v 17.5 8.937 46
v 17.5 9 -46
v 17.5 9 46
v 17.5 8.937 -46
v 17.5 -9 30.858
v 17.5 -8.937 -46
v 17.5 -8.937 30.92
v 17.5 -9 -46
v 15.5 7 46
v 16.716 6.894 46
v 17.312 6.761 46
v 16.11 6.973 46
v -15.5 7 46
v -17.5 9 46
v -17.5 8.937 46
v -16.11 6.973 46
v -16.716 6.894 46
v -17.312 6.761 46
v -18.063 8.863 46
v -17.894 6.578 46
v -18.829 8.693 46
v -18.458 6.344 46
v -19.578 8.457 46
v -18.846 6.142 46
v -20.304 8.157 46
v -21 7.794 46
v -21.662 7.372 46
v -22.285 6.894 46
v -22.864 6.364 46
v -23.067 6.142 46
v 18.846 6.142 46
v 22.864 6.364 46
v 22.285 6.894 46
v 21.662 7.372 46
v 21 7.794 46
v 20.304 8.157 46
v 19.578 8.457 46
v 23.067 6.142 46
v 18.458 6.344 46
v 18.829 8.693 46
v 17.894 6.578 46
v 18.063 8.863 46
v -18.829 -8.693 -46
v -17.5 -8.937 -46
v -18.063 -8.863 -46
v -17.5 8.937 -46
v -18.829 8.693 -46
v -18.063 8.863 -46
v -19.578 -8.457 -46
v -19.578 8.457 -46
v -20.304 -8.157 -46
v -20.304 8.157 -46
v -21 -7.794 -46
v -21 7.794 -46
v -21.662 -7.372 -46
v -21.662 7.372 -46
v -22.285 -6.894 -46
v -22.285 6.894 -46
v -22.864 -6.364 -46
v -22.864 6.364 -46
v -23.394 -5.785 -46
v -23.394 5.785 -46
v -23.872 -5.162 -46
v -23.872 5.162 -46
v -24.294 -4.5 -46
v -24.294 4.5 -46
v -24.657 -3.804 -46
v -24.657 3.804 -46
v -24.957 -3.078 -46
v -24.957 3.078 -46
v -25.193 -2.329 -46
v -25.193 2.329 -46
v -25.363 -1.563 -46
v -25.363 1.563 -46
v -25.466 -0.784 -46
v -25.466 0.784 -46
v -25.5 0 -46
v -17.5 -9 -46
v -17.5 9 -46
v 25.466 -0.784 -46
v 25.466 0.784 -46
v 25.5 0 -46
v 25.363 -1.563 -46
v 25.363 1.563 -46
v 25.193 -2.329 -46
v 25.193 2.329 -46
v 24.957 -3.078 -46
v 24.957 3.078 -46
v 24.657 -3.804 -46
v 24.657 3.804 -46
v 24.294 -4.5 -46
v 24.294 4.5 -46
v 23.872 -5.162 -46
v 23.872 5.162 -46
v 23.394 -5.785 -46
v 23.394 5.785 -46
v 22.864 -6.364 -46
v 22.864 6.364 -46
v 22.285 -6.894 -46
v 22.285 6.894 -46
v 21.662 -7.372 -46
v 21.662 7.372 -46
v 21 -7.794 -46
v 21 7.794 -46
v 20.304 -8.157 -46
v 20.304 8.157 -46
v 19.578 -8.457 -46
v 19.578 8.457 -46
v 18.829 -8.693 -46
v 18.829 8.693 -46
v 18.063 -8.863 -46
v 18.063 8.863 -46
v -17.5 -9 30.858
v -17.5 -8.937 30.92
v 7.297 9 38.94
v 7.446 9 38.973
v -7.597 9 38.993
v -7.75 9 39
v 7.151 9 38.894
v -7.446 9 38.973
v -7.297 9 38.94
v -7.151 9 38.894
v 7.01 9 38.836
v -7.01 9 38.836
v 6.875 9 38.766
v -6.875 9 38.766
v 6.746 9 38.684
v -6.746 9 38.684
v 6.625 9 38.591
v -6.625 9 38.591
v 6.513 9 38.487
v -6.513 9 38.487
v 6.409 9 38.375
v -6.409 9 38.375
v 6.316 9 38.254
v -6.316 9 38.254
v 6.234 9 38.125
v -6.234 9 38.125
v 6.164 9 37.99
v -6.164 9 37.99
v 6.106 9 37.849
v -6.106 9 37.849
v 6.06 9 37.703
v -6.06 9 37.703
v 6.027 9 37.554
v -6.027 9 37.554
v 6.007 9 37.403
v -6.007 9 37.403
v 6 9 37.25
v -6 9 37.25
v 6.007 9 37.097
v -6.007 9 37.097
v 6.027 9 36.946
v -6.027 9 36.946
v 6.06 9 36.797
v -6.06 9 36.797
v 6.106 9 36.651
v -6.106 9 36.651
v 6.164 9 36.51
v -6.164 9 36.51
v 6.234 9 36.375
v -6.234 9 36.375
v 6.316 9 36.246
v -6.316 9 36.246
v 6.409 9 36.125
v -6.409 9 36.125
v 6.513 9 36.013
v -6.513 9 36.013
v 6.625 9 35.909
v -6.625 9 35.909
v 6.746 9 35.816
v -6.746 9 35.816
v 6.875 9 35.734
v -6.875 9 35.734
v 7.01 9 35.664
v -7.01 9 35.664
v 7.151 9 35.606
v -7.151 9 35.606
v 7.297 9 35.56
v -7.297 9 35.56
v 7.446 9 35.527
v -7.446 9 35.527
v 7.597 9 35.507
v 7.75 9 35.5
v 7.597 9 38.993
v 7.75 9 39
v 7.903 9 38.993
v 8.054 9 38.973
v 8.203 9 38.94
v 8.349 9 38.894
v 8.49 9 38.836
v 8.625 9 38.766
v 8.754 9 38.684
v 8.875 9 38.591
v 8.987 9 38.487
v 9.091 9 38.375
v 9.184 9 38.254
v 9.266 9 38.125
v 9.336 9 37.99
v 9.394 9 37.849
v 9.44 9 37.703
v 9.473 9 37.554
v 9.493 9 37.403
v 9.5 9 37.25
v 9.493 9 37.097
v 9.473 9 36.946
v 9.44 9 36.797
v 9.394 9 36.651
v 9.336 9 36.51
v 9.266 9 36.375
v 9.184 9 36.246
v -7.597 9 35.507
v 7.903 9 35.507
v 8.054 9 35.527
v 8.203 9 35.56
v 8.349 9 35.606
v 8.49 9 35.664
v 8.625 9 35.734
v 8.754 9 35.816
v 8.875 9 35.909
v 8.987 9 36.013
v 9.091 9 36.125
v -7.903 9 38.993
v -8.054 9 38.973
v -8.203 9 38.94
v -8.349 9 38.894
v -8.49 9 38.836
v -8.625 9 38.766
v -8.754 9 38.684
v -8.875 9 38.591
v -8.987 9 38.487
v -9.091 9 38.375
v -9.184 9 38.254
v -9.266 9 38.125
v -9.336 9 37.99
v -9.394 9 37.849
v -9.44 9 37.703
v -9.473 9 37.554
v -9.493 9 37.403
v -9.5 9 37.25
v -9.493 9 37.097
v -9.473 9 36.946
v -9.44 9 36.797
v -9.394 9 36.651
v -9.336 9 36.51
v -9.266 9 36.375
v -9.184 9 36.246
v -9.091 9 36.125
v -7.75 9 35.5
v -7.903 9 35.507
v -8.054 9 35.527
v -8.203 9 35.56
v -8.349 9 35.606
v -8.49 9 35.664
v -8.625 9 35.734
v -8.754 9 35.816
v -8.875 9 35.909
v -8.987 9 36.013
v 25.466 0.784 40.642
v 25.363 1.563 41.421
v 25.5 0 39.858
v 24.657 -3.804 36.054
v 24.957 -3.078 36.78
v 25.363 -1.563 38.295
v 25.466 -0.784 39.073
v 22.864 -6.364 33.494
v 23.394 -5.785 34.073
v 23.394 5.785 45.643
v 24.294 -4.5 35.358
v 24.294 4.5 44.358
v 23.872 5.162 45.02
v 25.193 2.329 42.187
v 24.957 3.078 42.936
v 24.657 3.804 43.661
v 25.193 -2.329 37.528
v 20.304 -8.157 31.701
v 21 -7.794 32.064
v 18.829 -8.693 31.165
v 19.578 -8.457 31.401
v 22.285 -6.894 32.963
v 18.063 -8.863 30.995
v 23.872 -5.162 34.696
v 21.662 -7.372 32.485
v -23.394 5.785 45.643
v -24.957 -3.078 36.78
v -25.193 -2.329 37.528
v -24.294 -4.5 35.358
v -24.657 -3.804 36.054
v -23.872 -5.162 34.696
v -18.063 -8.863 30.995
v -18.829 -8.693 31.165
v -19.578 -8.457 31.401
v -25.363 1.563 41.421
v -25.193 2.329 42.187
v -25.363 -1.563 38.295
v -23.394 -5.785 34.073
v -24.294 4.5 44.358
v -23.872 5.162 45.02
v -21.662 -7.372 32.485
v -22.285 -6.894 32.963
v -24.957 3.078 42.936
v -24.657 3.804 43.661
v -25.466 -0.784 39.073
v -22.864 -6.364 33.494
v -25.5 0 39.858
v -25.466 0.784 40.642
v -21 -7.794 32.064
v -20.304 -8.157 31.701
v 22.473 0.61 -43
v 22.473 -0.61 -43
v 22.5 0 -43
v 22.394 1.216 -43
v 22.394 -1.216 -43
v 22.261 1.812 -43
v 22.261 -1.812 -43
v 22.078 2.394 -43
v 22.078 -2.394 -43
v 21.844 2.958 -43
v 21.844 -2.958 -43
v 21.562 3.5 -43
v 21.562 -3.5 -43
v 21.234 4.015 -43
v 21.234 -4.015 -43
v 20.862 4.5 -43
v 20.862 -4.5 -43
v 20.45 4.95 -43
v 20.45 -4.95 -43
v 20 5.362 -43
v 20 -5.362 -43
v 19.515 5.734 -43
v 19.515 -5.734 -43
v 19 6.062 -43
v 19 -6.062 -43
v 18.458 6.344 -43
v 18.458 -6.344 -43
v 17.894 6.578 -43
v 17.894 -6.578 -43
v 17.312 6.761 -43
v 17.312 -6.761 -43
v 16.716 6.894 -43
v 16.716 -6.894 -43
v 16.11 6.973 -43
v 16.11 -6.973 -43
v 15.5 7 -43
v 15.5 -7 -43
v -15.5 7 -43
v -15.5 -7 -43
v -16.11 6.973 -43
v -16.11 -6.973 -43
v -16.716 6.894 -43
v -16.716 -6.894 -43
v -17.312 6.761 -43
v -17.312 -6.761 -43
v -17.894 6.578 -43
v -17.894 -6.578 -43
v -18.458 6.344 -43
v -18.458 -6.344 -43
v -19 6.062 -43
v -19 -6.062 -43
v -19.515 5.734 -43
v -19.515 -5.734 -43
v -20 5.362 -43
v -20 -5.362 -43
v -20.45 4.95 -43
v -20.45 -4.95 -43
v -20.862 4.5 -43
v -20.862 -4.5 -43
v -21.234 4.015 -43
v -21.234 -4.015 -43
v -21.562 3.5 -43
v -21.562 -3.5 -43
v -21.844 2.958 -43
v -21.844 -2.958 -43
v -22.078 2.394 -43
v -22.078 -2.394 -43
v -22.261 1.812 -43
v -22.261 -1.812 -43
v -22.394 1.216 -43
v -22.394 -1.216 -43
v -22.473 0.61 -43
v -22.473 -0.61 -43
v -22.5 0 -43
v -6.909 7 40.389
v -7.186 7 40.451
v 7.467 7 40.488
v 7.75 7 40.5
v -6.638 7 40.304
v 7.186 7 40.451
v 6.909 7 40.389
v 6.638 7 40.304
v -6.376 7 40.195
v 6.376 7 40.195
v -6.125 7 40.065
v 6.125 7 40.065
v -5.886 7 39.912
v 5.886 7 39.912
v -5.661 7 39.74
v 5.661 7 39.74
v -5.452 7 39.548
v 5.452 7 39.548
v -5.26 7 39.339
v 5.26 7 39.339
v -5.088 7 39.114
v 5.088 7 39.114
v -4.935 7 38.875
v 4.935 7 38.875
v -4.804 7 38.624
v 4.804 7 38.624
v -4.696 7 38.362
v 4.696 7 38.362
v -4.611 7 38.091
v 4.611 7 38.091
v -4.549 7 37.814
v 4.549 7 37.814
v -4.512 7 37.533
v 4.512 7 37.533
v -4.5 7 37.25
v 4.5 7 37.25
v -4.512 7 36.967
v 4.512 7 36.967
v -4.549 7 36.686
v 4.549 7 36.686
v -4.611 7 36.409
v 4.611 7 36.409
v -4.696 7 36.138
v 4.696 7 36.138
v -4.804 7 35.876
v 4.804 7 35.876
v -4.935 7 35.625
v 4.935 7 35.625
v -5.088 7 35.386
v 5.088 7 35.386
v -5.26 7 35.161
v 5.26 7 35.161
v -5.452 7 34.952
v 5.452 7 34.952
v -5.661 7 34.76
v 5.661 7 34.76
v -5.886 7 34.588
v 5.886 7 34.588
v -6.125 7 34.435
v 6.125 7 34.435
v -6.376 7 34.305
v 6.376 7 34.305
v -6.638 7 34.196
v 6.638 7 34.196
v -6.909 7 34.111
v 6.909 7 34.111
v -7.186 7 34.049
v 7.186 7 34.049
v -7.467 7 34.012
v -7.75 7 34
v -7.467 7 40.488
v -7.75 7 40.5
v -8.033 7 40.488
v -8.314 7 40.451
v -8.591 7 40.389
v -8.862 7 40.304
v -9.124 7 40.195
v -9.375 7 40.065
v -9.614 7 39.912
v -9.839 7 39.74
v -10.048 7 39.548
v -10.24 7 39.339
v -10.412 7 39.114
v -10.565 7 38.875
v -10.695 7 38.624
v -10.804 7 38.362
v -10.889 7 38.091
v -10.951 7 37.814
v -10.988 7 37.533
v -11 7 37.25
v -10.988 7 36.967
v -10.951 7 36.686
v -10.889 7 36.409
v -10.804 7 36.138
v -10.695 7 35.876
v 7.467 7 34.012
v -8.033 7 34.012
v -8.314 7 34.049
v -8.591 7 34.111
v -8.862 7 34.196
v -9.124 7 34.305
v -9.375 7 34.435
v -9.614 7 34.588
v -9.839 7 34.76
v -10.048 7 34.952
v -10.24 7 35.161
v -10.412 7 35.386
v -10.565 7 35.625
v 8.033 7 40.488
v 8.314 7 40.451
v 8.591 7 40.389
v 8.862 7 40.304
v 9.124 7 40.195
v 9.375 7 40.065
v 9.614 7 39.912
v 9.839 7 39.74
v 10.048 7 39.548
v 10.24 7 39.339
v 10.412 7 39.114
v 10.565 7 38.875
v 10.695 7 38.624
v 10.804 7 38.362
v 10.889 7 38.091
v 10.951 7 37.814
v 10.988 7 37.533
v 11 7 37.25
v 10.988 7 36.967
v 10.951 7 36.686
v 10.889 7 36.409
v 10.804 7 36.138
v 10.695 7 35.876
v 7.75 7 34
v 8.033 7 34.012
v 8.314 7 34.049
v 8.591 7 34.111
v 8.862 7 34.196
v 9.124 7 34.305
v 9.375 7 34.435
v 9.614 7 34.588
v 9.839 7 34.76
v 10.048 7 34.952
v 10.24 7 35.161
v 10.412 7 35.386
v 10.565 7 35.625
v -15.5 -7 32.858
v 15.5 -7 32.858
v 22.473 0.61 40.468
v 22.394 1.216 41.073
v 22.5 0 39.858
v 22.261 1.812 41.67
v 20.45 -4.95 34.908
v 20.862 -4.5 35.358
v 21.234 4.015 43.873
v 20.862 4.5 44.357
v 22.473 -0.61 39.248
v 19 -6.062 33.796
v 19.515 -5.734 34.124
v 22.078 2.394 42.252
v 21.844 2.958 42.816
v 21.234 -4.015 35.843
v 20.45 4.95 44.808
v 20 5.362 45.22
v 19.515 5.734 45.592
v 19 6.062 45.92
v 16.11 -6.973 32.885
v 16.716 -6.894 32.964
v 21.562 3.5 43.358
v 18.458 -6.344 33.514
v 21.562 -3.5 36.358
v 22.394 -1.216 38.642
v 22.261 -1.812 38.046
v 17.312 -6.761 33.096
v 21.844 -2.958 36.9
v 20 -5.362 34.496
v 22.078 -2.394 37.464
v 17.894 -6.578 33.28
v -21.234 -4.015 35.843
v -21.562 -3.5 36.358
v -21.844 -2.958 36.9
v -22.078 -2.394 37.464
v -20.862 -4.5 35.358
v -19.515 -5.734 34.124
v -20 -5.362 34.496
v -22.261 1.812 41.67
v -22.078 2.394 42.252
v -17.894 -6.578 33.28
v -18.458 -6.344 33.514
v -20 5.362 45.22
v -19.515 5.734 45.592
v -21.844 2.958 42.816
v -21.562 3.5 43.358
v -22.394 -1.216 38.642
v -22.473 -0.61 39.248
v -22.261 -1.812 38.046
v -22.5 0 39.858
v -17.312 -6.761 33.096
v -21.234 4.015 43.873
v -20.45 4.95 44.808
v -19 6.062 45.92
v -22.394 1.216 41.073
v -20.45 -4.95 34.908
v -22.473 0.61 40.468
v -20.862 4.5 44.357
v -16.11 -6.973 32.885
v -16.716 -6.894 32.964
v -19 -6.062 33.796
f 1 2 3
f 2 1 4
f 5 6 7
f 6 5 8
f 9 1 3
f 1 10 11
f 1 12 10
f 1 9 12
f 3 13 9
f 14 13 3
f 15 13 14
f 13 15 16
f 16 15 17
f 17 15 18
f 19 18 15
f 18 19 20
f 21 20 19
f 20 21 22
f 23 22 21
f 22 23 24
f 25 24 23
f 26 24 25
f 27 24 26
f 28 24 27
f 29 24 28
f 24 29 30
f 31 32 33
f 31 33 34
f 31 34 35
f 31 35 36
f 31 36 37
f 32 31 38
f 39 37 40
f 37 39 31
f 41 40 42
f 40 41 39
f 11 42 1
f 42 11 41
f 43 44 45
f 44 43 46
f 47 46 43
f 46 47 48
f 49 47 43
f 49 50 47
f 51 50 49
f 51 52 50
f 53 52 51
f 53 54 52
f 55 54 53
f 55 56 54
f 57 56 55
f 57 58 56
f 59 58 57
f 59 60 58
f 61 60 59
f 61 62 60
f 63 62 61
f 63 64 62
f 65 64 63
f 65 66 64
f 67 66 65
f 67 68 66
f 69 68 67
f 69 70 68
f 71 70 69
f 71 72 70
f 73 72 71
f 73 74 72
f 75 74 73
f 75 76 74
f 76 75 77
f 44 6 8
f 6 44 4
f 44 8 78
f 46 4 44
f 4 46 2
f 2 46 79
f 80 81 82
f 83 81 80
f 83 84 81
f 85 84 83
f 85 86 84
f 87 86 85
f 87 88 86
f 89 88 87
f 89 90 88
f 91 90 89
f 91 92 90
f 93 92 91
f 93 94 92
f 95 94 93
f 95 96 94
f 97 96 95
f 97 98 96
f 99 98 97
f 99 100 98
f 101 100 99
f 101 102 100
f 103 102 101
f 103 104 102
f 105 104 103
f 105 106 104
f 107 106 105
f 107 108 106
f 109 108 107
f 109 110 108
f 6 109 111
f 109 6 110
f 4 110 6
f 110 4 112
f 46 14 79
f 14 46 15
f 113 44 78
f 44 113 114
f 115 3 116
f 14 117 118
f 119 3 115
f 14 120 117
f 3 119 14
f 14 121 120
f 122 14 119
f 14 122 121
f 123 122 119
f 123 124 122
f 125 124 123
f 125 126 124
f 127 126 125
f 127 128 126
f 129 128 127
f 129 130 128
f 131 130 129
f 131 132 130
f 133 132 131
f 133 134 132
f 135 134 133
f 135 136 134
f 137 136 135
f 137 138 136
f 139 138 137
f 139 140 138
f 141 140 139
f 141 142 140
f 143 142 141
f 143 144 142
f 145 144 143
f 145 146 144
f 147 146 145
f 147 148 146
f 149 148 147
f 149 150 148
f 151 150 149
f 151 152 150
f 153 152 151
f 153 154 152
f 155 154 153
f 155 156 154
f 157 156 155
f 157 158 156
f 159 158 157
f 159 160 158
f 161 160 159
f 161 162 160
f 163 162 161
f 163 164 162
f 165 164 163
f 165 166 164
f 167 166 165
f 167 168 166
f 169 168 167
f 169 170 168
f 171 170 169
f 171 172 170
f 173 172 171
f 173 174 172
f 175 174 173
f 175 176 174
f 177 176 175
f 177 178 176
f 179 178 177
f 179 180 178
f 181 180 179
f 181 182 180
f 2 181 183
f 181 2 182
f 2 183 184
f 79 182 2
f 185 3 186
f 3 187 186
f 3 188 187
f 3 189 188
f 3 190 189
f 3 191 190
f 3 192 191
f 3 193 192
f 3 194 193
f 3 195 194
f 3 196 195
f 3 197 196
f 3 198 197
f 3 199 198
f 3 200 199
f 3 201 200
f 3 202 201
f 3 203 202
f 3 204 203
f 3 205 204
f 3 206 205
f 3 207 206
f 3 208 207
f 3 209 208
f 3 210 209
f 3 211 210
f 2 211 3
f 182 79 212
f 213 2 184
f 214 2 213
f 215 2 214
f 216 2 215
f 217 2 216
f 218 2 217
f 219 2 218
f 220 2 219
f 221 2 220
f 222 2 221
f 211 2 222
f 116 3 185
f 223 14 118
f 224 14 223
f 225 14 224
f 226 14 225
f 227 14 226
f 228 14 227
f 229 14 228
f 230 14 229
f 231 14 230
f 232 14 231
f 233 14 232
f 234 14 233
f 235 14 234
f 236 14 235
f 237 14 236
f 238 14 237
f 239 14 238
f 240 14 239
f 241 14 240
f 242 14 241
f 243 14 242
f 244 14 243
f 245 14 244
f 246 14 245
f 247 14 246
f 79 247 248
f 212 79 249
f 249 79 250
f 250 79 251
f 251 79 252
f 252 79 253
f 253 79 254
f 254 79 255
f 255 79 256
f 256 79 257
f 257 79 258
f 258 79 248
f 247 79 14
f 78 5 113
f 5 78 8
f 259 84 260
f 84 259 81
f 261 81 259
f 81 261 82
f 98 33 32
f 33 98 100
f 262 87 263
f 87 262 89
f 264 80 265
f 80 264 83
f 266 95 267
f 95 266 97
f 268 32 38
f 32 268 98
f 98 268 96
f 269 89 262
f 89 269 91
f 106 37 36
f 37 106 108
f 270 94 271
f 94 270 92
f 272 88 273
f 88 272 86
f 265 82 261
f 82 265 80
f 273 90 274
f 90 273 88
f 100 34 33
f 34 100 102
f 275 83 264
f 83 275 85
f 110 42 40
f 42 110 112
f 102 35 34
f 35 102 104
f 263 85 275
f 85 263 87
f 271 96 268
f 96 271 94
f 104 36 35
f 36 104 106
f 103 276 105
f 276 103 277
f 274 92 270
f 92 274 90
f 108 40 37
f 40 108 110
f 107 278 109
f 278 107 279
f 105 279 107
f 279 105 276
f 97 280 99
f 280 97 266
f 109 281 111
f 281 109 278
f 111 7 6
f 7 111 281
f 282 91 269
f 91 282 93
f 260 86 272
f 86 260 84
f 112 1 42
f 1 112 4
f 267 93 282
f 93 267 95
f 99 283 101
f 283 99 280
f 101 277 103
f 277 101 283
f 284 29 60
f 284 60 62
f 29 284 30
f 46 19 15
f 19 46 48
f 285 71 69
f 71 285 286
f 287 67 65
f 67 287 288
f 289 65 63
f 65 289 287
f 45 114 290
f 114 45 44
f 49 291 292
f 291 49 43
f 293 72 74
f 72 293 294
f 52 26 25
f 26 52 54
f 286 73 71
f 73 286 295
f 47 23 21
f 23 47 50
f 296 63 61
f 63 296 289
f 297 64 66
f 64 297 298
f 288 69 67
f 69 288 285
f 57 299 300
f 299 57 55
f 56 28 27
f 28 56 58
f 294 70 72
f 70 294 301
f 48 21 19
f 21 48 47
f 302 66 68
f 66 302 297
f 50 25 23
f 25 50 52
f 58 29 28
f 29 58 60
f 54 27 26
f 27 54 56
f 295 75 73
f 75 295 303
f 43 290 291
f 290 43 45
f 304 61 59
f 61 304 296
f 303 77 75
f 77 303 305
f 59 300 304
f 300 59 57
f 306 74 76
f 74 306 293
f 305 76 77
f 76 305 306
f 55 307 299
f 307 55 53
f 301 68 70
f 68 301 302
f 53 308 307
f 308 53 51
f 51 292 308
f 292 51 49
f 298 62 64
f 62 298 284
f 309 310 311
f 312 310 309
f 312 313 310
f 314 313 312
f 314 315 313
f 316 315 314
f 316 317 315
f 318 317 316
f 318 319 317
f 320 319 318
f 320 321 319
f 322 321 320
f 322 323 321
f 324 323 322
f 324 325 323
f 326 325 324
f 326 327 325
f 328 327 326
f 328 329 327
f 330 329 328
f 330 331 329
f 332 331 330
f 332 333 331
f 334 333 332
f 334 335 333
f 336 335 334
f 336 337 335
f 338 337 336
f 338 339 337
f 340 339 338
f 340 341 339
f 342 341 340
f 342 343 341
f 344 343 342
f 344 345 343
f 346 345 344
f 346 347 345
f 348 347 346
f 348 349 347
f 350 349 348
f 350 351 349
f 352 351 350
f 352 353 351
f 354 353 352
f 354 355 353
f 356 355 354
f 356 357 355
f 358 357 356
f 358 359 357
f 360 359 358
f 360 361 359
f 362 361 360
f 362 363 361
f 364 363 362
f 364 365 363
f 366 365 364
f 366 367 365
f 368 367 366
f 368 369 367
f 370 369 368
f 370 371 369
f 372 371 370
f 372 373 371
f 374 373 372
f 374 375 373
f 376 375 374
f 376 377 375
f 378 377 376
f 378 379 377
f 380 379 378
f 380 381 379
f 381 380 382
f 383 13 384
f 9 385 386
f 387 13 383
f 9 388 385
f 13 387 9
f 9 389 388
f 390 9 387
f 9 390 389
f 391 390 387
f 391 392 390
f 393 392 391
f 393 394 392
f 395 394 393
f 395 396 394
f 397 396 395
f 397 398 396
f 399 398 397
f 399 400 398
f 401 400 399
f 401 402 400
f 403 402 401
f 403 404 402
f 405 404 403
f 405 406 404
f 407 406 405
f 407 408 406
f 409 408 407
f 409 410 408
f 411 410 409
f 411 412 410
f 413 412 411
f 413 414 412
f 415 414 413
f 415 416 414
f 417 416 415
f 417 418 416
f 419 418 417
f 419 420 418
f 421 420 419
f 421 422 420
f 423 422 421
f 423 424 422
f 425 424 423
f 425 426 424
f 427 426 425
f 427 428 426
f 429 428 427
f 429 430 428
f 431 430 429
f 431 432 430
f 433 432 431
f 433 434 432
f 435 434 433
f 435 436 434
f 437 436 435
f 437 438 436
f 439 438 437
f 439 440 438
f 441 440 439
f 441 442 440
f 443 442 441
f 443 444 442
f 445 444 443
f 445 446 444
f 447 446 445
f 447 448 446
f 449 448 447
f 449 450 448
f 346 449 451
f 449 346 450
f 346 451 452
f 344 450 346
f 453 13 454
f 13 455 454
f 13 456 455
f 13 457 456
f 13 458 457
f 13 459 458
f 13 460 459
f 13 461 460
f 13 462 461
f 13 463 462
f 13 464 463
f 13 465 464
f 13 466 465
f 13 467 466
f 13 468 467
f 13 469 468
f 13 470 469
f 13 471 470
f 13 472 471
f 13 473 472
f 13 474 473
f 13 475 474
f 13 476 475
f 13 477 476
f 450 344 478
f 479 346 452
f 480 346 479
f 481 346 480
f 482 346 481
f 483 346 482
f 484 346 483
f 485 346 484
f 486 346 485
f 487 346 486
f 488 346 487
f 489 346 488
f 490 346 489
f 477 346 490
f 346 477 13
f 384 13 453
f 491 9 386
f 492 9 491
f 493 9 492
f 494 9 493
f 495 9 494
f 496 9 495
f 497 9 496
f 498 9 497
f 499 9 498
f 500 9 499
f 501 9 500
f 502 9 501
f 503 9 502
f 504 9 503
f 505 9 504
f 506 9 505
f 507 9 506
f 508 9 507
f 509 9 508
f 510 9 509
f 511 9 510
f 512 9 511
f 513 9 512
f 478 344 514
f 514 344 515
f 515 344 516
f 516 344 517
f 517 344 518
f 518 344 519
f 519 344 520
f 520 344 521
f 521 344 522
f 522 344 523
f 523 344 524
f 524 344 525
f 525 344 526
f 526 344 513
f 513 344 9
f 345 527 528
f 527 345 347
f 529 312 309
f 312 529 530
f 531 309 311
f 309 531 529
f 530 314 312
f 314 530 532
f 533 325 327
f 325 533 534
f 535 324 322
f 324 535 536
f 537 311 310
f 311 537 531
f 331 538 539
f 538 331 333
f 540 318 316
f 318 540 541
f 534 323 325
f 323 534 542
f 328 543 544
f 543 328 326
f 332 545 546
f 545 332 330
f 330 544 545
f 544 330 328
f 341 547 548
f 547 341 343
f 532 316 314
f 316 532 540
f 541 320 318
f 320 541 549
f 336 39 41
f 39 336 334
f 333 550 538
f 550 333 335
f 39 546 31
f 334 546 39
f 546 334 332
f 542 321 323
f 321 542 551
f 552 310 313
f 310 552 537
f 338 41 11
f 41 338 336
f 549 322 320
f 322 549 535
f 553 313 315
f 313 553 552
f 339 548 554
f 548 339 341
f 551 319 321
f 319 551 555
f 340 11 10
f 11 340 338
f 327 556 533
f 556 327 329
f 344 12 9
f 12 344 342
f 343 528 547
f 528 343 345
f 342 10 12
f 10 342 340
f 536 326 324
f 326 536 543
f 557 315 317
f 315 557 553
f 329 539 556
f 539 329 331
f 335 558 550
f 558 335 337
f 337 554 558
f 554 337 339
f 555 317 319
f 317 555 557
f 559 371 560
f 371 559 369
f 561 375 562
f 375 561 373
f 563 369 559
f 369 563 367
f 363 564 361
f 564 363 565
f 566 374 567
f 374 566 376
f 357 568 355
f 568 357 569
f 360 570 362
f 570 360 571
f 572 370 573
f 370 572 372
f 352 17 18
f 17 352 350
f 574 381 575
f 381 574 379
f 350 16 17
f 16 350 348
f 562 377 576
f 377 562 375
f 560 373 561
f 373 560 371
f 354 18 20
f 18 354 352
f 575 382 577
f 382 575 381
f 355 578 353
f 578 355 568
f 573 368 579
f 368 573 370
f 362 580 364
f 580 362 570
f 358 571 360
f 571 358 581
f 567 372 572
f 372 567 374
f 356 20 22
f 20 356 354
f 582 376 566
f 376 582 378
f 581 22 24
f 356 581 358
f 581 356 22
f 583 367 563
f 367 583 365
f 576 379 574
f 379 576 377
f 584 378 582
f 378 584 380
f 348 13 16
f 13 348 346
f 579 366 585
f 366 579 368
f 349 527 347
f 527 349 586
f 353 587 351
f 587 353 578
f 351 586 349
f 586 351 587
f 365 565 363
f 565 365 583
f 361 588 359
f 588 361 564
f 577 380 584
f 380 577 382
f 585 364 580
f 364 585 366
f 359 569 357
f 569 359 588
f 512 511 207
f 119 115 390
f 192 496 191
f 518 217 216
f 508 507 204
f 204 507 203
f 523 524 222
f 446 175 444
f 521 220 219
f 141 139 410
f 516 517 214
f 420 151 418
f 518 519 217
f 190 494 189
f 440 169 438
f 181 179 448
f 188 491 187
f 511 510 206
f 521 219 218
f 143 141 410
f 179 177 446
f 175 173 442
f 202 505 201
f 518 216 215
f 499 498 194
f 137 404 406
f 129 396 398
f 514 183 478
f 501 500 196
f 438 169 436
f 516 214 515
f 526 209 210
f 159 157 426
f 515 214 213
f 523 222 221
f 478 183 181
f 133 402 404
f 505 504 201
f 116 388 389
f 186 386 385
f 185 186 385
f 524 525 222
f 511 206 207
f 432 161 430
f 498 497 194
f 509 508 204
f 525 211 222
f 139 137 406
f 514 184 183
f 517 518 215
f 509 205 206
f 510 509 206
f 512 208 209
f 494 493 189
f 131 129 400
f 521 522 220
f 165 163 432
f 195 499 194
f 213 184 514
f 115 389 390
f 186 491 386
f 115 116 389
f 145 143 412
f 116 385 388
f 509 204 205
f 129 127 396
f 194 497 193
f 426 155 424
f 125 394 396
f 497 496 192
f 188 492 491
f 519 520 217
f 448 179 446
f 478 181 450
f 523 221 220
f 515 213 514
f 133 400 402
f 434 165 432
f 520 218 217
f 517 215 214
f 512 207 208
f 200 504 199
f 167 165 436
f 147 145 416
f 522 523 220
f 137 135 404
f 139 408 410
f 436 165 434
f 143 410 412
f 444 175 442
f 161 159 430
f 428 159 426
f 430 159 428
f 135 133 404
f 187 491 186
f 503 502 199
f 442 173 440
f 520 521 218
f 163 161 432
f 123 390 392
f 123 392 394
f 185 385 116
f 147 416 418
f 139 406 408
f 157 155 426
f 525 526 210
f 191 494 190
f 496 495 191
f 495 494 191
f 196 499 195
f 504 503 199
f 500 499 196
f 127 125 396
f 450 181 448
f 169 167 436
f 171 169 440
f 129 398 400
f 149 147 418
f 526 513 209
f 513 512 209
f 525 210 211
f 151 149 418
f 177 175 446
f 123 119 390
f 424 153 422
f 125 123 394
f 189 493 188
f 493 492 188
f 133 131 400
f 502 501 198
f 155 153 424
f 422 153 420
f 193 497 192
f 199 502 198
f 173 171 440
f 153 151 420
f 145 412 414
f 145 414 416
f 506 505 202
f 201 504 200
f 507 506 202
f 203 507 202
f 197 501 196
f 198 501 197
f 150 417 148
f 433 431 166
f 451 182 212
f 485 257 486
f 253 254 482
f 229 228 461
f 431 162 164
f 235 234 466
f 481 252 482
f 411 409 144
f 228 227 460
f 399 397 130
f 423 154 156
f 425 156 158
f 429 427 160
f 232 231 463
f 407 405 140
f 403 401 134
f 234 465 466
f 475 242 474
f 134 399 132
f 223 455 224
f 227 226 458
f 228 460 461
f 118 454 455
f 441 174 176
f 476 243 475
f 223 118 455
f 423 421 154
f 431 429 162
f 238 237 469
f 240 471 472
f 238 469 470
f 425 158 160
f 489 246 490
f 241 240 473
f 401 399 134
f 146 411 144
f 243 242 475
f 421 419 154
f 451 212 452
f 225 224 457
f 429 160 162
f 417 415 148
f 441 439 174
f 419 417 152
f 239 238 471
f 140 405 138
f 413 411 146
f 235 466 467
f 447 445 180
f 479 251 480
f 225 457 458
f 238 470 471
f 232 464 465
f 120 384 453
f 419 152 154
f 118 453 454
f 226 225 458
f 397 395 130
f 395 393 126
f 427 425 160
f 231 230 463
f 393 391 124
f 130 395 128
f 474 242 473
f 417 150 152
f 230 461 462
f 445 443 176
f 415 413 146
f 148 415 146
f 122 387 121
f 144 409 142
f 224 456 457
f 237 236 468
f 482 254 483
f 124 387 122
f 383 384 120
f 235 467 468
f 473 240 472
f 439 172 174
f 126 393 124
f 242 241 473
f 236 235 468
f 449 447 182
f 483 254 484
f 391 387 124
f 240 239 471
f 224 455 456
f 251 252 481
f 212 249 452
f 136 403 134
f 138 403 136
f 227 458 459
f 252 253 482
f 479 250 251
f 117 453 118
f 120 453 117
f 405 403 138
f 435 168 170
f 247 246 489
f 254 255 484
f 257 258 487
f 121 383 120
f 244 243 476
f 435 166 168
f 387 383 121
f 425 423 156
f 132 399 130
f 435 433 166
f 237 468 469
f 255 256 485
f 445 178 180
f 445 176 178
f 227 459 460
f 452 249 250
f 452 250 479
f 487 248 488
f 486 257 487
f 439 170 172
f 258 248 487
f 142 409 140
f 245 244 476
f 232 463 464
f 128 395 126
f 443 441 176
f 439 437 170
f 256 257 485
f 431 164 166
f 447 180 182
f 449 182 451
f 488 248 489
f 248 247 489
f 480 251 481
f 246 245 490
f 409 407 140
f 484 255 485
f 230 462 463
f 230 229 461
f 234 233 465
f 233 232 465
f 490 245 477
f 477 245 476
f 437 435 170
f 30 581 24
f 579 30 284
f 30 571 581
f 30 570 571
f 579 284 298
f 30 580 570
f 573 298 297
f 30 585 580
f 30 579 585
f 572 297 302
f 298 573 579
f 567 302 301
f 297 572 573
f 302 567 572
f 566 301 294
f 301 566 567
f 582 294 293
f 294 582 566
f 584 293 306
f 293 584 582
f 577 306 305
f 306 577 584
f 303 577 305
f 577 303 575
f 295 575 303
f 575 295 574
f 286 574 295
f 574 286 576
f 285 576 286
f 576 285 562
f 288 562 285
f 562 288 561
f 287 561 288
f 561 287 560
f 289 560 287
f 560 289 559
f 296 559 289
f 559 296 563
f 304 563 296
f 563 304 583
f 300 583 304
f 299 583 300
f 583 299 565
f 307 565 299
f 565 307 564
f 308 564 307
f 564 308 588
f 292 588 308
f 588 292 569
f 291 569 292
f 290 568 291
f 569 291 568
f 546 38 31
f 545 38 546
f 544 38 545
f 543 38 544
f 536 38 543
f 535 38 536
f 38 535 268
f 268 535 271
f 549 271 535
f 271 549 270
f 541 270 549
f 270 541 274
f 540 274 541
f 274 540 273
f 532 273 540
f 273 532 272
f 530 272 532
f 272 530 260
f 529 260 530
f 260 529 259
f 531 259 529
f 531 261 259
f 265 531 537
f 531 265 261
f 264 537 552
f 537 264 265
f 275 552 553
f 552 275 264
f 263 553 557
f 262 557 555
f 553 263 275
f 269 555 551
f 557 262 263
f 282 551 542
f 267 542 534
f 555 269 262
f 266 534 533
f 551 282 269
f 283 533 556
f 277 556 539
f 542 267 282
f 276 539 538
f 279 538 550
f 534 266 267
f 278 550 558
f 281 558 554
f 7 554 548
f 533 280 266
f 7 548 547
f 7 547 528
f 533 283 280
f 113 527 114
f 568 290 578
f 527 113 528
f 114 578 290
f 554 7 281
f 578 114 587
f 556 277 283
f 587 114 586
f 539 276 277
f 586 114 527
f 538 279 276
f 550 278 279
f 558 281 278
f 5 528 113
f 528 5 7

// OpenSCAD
remz = 90;
remx = 45;
remy = 14;

shell = 2;

coverage = 0.75;

shd = 6.5;
shh = 2;
ssd = 3.5;

$fn = 72;


module oshell(){
    cube([remx + (2*shell) - remy, remy + (2*shell), remz + shell], center=true);

    translate([(remx + (shell) - remy)/2,0,0]){
        cylinder(h=remz+shell, d=remy + (2*shell), center=true);
    }

    translate([-(remx + (shell) - remy)/2,0,0]){
        cylinder(h=remz+shell, d=remy + (2*shell), center=true);
    }
}

module remote(){
    cube([remx - remy, remy, remz], center=true);

    translate([(remx - remy)/2,0,0]){
        cylinder(h=remz, d=remy, center=true);
    }

    translate([-(remx - remy)/2,0,0]){
        cylinder(h=remz, d=remy, center=true);
    }
}



difference(){
    oshell();
    translate([0,0,shell]){
        remote();
    }
    
    translate([(remx - remy)/4,(remy+shell)/2,((remz)/2) - ((remx - remy)/4)]){
        rotate([90,0,0]){
            cylinder(h = shh, d2 = shd, d1 = ssd, center=true);
        }
    }

    translate([-(remx - remy)/4,(remy+shell)/2,((remz)/2) - ((remx - remy)/4)]){
        rotate([90,0,0]){
            cylinder(h = shh, d2 = shd, d1 = ssd, center=true);
        }
    }
    
    translate([0,0,54]){
        rotate([45,0,0]){
            #cube([2*remx, 3*(remy + (2*shell)),20], center=true);
        }
    }
}
